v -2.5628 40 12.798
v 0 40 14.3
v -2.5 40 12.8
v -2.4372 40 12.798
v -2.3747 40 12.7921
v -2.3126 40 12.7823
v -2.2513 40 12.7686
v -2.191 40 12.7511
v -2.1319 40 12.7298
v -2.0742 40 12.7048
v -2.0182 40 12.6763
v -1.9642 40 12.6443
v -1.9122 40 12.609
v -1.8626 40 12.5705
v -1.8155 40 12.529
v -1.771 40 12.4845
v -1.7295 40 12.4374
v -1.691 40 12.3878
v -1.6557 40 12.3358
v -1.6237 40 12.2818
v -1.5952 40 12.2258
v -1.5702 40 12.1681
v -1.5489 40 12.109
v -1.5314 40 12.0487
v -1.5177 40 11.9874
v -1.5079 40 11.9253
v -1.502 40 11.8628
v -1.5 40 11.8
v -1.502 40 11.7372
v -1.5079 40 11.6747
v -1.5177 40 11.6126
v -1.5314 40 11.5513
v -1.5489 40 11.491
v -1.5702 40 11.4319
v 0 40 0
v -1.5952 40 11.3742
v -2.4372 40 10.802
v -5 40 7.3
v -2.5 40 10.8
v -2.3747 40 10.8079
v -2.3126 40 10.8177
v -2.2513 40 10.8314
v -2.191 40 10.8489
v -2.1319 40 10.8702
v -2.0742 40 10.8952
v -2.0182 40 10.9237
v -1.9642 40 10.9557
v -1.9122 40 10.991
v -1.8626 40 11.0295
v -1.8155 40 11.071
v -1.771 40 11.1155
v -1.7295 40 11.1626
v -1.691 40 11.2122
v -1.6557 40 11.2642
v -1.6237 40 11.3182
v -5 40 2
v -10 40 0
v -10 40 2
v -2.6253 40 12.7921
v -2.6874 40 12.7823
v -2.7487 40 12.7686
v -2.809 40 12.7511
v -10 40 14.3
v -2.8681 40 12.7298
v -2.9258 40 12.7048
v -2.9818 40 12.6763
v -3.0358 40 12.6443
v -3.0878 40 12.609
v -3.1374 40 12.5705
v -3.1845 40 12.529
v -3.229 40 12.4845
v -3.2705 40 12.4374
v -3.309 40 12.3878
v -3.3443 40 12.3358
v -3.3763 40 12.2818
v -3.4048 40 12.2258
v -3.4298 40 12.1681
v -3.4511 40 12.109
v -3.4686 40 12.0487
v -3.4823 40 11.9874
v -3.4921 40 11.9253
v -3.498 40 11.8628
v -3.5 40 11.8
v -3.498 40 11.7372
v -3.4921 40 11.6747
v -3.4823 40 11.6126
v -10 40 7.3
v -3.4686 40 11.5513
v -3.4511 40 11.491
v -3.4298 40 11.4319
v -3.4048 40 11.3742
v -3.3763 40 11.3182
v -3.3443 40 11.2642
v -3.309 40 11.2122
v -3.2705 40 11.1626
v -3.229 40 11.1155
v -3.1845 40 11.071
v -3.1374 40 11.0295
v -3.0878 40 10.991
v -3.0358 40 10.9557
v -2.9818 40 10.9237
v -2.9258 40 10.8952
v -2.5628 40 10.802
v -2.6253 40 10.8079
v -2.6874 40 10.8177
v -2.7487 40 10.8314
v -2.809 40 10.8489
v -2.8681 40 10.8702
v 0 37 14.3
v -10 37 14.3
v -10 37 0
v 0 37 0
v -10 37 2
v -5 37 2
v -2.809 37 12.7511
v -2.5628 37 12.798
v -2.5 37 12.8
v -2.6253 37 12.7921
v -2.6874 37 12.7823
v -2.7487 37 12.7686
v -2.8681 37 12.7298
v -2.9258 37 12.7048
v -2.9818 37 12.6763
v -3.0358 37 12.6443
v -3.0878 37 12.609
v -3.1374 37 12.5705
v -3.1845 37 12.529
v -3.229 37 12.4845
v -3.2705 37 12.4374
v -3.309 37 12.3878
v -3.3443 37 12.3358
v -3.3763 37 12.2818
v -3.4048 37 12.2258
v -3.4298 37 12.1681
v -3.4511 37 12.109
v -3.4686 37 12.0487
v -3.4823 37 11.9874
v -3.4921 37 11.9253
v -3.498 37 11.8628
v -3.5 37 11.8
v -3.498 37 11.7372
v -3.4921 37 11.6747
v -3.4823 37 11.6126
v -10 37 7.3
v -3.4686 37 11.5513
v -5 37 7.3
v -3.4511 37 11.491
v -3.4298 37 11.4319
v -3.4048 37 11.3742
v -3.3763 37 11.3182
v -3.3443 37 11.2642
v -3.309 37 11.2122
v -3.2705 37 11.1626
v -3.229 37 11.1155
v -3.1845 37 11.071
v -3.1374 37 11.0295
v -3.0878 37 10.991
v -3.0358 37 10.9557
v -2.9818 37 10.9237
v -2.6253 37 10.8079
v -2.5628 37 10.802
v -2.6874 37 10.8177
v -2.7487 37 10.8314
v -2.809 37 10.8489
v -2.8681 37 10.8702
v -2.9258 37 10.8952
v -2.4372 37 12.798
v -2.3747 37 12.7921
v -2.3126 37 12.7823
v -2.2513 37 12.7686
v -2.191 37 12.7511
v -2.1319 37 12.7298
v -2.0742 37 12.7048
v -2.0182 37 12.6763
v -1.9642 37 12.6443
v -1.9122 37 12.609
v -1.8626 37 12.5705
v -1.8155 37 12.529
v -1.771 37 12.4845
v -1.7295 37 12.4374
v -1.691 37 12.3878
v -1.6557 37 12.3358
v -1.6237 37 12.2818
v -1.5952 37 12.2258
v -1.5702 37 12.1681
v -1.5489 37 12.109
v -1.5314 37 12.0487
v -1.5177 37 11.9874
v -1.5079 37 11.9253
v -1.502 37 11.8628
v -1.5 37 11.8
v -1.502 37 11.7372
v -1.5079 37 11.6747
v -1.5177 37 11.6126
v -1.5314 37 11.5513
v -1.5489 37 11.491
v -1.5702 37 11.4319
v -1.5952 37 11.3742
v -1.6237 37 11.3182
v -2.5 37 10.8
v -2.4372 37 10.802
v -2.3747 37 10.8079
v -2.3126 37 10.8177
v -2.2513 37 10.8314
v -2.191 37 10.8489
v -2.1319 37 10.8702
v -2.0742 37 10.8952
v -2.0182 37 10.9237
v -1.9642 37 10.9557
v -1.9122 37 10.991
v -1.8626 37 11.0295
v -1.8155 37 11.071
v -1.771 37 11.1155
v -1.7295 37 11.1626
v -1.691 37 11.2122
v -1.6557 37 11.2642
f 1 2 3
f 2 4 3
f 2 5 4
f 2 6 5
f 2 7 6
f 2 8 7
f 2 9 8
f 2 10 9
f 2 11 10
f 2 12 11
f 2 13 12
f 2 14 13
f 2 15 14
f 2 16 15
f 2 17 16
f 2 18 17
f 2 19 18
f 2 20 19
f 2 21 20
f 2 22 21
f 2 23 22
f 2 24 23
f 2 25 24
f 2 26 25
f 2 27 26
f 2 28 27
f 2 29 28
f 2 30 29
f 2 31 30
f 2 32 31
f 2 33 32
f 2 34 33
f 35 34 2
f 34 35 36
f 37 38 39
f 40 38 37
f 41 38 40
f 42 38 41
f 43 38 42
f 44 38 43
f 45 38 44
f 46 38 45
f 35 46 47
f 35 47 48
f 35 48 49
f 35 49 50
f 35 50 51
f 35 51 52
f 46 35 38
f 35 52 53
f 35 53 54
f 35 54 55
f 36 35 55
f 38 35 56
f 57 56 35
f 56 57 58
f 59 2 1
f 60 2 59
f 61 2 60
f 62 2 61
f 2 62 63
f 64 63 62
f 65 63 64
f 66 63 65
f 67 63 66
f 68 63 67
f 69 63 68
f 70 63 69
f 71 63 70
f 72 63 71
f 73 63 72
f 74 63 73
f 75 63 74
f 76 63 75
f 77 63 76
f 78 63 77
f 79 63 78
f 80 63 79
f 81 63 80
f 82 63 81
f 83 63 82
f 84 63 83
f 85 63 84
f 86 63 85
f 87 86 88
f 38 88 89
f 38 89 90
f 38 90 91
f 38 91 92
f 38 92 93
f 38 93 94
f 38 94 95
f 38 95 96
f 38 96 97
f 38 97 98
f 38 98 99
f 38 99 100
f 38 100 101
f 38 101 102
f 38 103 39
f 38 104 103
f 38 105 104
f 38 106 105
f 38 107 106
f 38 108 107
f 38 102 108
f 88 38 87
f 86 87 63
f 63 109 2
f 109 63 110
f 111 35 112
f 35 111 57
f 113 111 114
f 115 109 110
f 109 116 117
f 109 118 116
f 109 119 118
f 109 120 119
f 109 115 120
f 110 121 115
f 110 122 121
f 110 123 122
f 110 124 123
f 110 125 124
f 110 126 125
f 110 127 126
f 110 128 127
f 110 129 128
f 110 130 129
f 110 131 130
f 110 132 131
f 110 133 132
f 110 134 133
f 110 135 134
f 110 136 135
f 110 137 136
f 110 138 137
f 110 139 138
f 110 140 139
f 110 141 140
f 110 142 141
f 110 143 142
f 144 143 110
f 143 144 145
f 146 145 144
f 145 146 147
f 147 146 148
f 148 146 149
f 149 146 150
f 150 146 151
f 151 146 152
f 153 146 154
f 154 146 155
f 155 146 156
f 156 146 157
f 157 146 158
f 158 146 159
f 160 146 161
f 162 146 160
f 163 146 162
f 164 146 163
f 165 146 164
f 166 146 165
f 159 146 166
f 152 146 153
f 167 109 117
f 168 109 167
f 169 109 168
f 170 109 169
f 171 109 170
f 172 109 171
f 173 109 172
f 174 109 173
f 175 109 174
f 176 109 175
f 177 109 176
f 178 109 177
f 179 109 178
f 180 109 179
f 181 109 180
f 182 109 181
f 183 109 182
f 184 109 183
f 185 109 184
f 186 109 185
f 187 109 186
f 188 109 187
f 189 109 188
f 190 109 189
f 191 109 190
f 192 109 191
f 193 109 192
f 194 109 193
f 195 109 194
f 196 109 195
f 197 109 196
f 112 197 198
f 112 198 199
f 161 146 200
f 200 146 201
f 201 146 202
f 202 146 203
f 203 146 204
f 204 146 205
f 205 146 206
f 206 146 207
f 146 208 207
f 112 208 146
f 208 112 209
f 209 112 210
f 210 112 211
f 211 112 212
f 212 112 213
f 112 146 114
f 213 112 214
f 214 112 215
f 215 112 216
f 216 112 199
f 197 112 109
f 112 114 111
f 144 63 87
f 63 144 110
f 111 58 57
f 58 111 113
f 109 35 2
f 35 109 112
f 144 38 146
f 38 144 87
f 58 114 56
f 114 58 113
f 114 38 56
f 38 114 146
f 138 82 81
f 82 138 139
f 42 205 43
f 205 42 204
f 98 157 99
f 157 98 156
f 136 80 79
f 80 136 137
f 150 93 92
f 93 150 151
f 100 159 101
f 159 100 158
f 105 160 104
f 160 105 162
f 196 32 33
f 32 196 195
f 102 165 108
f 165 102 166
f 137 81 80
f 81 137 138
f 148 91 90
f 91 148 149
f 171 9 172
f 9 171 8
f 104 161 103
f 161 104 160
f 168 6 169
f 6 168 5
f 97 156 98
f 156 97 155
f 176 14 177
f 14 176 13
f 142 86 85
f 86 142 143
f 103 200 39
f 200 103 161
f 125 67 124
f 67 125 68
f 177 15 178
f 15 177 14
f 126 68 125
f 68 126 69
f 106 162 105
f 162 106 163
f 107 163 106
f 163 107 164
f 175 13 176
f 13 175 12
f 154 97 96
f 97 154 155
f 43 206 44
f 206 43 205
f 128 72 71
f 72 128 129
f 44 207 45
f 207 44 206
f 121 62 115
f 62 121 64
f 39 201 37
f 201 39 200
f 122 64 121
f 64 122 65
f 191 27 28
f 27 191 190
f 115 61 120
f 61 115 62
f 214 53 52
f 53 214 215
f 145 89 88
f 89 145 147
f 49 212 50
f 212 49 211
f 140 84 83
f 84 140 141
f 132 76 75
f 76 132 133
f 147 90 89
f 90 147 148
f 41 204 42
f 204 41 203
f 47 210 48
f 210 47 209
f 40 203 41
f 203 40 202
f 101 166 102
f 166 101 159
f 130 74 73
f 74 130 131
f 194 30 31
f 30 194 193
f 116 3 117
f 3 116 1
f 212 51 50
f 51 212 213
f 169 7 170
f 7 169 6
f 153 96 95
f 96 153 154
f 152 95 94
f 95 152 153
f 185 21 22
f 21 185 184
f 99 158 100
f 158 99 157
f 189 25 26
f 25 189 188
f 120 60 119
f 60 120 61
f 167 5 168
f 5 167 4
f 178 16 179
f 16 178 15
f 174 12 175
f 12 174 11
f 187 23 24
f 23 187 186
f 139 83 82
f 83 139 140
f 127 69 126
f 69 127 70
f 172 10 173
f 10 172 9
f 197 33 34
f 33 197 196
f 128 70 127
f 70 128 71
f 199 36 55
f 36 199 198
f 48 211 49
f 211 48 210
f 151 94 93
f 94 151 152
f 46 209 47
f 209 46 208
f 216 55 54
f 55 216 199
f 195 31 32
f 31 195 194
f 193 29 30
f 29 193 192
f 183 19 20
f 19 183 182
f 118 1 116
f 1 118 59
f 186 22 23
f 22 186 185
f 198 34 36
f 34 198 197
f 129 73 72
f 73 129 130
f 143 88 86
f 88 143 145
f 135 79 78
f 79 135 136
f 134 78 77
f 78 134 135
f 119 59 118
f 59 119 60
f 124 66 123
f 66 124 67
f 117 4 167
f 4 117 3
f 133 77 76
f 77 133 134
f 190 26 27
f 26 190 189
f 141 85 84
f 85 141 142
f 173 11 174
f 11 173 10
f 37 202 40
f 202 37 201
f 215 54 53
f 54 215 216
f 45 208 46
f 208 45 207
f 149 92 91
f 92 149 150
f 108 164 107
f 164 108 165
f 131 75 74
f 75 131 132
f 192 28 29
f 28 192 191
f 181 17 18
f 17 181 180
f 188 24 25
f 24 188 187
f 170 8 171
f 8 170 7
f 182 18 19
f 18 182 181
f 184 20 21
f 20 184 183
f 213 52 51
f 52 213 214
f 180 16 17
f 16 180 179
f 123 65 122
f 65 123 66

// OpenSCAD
// Sumobot Ramp Design

$fn=100;

// Basically the ramp is a triangle design with an attached axle and cutout for the wheels

// Restrictions:
// - The horizontal distance must be less than ~57.3 to fit the height restriction

// Note all descriptions are with the ramp in active mode

// The modifiable variables:
incline_angle = 20; // degrees of ramp angle
clamp_clearance = 2; // height of clamp on either side up and down

// constant variables:
ramp_height = 11.5 + clamp_clearance; // This is calculated as the schematic gives 37.7 - 26 as the distance from the top of the frame to the ground, and then add clamp_clearance
ramp_length = 65; // TODO: a better size
chassis_height = 5.3; // measured ballast + pcb
clamp_width_inside = 5;
clamp_width = 5;
clamp_height_inside = 5;
clamp_width_total = clamp_width_inside + clamp_width;
axle_diameter = 2;
mount_length = 4;


// Calculate:

// width of the prism using tan(incline_angle)
ramp_width = ramp_height / tan(incline_angle);

echo(clamp_clearance=clamp_clearance);
echo(ramp_height=ramp_height);
echo(ramp_width=ramp_width);

// Export options
// 0 : none
// 1 : ramp
// 2: clamp

export=1;

// Ramp

if (export == 2 || export == 0) {

prism(ramp_length, ramp_width, ramp_height);

translate([-2.5, 4+35, 9.31]) {
   axle(clamp_width, axle_diameter, mount_length);
   translate([0, -6, 2]) {
    cube([4, 4, 4]); 
   }
}
}

if (export == 1 || export ==0) {

if(export == 0) {
translate([0, 30, 0]) {
    clamp(clamp_width_total, clamp_height_inside, axle_diameter, 3);
}
}

translate([0, 37, 0]) {
    clamp(clamp_width_total, clamp_height_inside, axle_diameter, 3);
}

}
// Modules

// Creates axle hole and mount
module axle(outer, inner, length) {
    translate([0, 0, outer / 2]) {
        rotate([90, 90, 0]) {
            translate([0, 0, length/2]) {
                    cylinder(d=outer, h=length, center=false);
                translate([0, 0, -5]) {
                    cylinder(h=length+10, d=inner, center=false);
                }
            }
        }
    }
}


module clamp(width, outer, inner, length) {
    rotate([0, 0, 90]){
        union() {
            difference() {
                whole = clamp_clearance * 2 + chassis_height + outer;
                cube([length, width, whole]);
                translate([0, clamp_width, clamp_clearance]) {
                    cube([length, 5, chassis_height]);
                }
                move_z = whole - (outer /2);
                move_y = 10 - 2.5;
                echo(move_z=move_z);
                translate([0, 2.5, move_z]) {
                    rotate([0, 90, 0]) {
                        cylinder(d= inner, h=length);
                    }
                }
            }
        }
    }
}

// RIGHT TRIANGLE PRISM: https://github.com/dannystaple/OpenSCAD-Parts-Library/blob/master/prism.scad
//Draw a prism based on a 
//right angled triangle
//l - length of prism
//w - width of triangle
//h - height of triangle
module prism(l, w, h) {
       polyhedron(points=[
               [0,0,h],           // 0    front top corner
               [0,0,0],[w,0,0],   // 1, 2 front left & right bottom corners
               [0,l,h],           // 3    back top corner
               [0,l,0],[w,l,0]    // 4, 5 back left & right bottom corners
       ], faces=[ // points for all faces must be ordered clockwise when looking in
               [0,2,1],    // top face
               [3,4,5],    // base face
               [0,1,4,3],  // h face
               [1,2,5,4],  // w face
               [0,3,5,2],  // hypotenuse face
       ]);
}
